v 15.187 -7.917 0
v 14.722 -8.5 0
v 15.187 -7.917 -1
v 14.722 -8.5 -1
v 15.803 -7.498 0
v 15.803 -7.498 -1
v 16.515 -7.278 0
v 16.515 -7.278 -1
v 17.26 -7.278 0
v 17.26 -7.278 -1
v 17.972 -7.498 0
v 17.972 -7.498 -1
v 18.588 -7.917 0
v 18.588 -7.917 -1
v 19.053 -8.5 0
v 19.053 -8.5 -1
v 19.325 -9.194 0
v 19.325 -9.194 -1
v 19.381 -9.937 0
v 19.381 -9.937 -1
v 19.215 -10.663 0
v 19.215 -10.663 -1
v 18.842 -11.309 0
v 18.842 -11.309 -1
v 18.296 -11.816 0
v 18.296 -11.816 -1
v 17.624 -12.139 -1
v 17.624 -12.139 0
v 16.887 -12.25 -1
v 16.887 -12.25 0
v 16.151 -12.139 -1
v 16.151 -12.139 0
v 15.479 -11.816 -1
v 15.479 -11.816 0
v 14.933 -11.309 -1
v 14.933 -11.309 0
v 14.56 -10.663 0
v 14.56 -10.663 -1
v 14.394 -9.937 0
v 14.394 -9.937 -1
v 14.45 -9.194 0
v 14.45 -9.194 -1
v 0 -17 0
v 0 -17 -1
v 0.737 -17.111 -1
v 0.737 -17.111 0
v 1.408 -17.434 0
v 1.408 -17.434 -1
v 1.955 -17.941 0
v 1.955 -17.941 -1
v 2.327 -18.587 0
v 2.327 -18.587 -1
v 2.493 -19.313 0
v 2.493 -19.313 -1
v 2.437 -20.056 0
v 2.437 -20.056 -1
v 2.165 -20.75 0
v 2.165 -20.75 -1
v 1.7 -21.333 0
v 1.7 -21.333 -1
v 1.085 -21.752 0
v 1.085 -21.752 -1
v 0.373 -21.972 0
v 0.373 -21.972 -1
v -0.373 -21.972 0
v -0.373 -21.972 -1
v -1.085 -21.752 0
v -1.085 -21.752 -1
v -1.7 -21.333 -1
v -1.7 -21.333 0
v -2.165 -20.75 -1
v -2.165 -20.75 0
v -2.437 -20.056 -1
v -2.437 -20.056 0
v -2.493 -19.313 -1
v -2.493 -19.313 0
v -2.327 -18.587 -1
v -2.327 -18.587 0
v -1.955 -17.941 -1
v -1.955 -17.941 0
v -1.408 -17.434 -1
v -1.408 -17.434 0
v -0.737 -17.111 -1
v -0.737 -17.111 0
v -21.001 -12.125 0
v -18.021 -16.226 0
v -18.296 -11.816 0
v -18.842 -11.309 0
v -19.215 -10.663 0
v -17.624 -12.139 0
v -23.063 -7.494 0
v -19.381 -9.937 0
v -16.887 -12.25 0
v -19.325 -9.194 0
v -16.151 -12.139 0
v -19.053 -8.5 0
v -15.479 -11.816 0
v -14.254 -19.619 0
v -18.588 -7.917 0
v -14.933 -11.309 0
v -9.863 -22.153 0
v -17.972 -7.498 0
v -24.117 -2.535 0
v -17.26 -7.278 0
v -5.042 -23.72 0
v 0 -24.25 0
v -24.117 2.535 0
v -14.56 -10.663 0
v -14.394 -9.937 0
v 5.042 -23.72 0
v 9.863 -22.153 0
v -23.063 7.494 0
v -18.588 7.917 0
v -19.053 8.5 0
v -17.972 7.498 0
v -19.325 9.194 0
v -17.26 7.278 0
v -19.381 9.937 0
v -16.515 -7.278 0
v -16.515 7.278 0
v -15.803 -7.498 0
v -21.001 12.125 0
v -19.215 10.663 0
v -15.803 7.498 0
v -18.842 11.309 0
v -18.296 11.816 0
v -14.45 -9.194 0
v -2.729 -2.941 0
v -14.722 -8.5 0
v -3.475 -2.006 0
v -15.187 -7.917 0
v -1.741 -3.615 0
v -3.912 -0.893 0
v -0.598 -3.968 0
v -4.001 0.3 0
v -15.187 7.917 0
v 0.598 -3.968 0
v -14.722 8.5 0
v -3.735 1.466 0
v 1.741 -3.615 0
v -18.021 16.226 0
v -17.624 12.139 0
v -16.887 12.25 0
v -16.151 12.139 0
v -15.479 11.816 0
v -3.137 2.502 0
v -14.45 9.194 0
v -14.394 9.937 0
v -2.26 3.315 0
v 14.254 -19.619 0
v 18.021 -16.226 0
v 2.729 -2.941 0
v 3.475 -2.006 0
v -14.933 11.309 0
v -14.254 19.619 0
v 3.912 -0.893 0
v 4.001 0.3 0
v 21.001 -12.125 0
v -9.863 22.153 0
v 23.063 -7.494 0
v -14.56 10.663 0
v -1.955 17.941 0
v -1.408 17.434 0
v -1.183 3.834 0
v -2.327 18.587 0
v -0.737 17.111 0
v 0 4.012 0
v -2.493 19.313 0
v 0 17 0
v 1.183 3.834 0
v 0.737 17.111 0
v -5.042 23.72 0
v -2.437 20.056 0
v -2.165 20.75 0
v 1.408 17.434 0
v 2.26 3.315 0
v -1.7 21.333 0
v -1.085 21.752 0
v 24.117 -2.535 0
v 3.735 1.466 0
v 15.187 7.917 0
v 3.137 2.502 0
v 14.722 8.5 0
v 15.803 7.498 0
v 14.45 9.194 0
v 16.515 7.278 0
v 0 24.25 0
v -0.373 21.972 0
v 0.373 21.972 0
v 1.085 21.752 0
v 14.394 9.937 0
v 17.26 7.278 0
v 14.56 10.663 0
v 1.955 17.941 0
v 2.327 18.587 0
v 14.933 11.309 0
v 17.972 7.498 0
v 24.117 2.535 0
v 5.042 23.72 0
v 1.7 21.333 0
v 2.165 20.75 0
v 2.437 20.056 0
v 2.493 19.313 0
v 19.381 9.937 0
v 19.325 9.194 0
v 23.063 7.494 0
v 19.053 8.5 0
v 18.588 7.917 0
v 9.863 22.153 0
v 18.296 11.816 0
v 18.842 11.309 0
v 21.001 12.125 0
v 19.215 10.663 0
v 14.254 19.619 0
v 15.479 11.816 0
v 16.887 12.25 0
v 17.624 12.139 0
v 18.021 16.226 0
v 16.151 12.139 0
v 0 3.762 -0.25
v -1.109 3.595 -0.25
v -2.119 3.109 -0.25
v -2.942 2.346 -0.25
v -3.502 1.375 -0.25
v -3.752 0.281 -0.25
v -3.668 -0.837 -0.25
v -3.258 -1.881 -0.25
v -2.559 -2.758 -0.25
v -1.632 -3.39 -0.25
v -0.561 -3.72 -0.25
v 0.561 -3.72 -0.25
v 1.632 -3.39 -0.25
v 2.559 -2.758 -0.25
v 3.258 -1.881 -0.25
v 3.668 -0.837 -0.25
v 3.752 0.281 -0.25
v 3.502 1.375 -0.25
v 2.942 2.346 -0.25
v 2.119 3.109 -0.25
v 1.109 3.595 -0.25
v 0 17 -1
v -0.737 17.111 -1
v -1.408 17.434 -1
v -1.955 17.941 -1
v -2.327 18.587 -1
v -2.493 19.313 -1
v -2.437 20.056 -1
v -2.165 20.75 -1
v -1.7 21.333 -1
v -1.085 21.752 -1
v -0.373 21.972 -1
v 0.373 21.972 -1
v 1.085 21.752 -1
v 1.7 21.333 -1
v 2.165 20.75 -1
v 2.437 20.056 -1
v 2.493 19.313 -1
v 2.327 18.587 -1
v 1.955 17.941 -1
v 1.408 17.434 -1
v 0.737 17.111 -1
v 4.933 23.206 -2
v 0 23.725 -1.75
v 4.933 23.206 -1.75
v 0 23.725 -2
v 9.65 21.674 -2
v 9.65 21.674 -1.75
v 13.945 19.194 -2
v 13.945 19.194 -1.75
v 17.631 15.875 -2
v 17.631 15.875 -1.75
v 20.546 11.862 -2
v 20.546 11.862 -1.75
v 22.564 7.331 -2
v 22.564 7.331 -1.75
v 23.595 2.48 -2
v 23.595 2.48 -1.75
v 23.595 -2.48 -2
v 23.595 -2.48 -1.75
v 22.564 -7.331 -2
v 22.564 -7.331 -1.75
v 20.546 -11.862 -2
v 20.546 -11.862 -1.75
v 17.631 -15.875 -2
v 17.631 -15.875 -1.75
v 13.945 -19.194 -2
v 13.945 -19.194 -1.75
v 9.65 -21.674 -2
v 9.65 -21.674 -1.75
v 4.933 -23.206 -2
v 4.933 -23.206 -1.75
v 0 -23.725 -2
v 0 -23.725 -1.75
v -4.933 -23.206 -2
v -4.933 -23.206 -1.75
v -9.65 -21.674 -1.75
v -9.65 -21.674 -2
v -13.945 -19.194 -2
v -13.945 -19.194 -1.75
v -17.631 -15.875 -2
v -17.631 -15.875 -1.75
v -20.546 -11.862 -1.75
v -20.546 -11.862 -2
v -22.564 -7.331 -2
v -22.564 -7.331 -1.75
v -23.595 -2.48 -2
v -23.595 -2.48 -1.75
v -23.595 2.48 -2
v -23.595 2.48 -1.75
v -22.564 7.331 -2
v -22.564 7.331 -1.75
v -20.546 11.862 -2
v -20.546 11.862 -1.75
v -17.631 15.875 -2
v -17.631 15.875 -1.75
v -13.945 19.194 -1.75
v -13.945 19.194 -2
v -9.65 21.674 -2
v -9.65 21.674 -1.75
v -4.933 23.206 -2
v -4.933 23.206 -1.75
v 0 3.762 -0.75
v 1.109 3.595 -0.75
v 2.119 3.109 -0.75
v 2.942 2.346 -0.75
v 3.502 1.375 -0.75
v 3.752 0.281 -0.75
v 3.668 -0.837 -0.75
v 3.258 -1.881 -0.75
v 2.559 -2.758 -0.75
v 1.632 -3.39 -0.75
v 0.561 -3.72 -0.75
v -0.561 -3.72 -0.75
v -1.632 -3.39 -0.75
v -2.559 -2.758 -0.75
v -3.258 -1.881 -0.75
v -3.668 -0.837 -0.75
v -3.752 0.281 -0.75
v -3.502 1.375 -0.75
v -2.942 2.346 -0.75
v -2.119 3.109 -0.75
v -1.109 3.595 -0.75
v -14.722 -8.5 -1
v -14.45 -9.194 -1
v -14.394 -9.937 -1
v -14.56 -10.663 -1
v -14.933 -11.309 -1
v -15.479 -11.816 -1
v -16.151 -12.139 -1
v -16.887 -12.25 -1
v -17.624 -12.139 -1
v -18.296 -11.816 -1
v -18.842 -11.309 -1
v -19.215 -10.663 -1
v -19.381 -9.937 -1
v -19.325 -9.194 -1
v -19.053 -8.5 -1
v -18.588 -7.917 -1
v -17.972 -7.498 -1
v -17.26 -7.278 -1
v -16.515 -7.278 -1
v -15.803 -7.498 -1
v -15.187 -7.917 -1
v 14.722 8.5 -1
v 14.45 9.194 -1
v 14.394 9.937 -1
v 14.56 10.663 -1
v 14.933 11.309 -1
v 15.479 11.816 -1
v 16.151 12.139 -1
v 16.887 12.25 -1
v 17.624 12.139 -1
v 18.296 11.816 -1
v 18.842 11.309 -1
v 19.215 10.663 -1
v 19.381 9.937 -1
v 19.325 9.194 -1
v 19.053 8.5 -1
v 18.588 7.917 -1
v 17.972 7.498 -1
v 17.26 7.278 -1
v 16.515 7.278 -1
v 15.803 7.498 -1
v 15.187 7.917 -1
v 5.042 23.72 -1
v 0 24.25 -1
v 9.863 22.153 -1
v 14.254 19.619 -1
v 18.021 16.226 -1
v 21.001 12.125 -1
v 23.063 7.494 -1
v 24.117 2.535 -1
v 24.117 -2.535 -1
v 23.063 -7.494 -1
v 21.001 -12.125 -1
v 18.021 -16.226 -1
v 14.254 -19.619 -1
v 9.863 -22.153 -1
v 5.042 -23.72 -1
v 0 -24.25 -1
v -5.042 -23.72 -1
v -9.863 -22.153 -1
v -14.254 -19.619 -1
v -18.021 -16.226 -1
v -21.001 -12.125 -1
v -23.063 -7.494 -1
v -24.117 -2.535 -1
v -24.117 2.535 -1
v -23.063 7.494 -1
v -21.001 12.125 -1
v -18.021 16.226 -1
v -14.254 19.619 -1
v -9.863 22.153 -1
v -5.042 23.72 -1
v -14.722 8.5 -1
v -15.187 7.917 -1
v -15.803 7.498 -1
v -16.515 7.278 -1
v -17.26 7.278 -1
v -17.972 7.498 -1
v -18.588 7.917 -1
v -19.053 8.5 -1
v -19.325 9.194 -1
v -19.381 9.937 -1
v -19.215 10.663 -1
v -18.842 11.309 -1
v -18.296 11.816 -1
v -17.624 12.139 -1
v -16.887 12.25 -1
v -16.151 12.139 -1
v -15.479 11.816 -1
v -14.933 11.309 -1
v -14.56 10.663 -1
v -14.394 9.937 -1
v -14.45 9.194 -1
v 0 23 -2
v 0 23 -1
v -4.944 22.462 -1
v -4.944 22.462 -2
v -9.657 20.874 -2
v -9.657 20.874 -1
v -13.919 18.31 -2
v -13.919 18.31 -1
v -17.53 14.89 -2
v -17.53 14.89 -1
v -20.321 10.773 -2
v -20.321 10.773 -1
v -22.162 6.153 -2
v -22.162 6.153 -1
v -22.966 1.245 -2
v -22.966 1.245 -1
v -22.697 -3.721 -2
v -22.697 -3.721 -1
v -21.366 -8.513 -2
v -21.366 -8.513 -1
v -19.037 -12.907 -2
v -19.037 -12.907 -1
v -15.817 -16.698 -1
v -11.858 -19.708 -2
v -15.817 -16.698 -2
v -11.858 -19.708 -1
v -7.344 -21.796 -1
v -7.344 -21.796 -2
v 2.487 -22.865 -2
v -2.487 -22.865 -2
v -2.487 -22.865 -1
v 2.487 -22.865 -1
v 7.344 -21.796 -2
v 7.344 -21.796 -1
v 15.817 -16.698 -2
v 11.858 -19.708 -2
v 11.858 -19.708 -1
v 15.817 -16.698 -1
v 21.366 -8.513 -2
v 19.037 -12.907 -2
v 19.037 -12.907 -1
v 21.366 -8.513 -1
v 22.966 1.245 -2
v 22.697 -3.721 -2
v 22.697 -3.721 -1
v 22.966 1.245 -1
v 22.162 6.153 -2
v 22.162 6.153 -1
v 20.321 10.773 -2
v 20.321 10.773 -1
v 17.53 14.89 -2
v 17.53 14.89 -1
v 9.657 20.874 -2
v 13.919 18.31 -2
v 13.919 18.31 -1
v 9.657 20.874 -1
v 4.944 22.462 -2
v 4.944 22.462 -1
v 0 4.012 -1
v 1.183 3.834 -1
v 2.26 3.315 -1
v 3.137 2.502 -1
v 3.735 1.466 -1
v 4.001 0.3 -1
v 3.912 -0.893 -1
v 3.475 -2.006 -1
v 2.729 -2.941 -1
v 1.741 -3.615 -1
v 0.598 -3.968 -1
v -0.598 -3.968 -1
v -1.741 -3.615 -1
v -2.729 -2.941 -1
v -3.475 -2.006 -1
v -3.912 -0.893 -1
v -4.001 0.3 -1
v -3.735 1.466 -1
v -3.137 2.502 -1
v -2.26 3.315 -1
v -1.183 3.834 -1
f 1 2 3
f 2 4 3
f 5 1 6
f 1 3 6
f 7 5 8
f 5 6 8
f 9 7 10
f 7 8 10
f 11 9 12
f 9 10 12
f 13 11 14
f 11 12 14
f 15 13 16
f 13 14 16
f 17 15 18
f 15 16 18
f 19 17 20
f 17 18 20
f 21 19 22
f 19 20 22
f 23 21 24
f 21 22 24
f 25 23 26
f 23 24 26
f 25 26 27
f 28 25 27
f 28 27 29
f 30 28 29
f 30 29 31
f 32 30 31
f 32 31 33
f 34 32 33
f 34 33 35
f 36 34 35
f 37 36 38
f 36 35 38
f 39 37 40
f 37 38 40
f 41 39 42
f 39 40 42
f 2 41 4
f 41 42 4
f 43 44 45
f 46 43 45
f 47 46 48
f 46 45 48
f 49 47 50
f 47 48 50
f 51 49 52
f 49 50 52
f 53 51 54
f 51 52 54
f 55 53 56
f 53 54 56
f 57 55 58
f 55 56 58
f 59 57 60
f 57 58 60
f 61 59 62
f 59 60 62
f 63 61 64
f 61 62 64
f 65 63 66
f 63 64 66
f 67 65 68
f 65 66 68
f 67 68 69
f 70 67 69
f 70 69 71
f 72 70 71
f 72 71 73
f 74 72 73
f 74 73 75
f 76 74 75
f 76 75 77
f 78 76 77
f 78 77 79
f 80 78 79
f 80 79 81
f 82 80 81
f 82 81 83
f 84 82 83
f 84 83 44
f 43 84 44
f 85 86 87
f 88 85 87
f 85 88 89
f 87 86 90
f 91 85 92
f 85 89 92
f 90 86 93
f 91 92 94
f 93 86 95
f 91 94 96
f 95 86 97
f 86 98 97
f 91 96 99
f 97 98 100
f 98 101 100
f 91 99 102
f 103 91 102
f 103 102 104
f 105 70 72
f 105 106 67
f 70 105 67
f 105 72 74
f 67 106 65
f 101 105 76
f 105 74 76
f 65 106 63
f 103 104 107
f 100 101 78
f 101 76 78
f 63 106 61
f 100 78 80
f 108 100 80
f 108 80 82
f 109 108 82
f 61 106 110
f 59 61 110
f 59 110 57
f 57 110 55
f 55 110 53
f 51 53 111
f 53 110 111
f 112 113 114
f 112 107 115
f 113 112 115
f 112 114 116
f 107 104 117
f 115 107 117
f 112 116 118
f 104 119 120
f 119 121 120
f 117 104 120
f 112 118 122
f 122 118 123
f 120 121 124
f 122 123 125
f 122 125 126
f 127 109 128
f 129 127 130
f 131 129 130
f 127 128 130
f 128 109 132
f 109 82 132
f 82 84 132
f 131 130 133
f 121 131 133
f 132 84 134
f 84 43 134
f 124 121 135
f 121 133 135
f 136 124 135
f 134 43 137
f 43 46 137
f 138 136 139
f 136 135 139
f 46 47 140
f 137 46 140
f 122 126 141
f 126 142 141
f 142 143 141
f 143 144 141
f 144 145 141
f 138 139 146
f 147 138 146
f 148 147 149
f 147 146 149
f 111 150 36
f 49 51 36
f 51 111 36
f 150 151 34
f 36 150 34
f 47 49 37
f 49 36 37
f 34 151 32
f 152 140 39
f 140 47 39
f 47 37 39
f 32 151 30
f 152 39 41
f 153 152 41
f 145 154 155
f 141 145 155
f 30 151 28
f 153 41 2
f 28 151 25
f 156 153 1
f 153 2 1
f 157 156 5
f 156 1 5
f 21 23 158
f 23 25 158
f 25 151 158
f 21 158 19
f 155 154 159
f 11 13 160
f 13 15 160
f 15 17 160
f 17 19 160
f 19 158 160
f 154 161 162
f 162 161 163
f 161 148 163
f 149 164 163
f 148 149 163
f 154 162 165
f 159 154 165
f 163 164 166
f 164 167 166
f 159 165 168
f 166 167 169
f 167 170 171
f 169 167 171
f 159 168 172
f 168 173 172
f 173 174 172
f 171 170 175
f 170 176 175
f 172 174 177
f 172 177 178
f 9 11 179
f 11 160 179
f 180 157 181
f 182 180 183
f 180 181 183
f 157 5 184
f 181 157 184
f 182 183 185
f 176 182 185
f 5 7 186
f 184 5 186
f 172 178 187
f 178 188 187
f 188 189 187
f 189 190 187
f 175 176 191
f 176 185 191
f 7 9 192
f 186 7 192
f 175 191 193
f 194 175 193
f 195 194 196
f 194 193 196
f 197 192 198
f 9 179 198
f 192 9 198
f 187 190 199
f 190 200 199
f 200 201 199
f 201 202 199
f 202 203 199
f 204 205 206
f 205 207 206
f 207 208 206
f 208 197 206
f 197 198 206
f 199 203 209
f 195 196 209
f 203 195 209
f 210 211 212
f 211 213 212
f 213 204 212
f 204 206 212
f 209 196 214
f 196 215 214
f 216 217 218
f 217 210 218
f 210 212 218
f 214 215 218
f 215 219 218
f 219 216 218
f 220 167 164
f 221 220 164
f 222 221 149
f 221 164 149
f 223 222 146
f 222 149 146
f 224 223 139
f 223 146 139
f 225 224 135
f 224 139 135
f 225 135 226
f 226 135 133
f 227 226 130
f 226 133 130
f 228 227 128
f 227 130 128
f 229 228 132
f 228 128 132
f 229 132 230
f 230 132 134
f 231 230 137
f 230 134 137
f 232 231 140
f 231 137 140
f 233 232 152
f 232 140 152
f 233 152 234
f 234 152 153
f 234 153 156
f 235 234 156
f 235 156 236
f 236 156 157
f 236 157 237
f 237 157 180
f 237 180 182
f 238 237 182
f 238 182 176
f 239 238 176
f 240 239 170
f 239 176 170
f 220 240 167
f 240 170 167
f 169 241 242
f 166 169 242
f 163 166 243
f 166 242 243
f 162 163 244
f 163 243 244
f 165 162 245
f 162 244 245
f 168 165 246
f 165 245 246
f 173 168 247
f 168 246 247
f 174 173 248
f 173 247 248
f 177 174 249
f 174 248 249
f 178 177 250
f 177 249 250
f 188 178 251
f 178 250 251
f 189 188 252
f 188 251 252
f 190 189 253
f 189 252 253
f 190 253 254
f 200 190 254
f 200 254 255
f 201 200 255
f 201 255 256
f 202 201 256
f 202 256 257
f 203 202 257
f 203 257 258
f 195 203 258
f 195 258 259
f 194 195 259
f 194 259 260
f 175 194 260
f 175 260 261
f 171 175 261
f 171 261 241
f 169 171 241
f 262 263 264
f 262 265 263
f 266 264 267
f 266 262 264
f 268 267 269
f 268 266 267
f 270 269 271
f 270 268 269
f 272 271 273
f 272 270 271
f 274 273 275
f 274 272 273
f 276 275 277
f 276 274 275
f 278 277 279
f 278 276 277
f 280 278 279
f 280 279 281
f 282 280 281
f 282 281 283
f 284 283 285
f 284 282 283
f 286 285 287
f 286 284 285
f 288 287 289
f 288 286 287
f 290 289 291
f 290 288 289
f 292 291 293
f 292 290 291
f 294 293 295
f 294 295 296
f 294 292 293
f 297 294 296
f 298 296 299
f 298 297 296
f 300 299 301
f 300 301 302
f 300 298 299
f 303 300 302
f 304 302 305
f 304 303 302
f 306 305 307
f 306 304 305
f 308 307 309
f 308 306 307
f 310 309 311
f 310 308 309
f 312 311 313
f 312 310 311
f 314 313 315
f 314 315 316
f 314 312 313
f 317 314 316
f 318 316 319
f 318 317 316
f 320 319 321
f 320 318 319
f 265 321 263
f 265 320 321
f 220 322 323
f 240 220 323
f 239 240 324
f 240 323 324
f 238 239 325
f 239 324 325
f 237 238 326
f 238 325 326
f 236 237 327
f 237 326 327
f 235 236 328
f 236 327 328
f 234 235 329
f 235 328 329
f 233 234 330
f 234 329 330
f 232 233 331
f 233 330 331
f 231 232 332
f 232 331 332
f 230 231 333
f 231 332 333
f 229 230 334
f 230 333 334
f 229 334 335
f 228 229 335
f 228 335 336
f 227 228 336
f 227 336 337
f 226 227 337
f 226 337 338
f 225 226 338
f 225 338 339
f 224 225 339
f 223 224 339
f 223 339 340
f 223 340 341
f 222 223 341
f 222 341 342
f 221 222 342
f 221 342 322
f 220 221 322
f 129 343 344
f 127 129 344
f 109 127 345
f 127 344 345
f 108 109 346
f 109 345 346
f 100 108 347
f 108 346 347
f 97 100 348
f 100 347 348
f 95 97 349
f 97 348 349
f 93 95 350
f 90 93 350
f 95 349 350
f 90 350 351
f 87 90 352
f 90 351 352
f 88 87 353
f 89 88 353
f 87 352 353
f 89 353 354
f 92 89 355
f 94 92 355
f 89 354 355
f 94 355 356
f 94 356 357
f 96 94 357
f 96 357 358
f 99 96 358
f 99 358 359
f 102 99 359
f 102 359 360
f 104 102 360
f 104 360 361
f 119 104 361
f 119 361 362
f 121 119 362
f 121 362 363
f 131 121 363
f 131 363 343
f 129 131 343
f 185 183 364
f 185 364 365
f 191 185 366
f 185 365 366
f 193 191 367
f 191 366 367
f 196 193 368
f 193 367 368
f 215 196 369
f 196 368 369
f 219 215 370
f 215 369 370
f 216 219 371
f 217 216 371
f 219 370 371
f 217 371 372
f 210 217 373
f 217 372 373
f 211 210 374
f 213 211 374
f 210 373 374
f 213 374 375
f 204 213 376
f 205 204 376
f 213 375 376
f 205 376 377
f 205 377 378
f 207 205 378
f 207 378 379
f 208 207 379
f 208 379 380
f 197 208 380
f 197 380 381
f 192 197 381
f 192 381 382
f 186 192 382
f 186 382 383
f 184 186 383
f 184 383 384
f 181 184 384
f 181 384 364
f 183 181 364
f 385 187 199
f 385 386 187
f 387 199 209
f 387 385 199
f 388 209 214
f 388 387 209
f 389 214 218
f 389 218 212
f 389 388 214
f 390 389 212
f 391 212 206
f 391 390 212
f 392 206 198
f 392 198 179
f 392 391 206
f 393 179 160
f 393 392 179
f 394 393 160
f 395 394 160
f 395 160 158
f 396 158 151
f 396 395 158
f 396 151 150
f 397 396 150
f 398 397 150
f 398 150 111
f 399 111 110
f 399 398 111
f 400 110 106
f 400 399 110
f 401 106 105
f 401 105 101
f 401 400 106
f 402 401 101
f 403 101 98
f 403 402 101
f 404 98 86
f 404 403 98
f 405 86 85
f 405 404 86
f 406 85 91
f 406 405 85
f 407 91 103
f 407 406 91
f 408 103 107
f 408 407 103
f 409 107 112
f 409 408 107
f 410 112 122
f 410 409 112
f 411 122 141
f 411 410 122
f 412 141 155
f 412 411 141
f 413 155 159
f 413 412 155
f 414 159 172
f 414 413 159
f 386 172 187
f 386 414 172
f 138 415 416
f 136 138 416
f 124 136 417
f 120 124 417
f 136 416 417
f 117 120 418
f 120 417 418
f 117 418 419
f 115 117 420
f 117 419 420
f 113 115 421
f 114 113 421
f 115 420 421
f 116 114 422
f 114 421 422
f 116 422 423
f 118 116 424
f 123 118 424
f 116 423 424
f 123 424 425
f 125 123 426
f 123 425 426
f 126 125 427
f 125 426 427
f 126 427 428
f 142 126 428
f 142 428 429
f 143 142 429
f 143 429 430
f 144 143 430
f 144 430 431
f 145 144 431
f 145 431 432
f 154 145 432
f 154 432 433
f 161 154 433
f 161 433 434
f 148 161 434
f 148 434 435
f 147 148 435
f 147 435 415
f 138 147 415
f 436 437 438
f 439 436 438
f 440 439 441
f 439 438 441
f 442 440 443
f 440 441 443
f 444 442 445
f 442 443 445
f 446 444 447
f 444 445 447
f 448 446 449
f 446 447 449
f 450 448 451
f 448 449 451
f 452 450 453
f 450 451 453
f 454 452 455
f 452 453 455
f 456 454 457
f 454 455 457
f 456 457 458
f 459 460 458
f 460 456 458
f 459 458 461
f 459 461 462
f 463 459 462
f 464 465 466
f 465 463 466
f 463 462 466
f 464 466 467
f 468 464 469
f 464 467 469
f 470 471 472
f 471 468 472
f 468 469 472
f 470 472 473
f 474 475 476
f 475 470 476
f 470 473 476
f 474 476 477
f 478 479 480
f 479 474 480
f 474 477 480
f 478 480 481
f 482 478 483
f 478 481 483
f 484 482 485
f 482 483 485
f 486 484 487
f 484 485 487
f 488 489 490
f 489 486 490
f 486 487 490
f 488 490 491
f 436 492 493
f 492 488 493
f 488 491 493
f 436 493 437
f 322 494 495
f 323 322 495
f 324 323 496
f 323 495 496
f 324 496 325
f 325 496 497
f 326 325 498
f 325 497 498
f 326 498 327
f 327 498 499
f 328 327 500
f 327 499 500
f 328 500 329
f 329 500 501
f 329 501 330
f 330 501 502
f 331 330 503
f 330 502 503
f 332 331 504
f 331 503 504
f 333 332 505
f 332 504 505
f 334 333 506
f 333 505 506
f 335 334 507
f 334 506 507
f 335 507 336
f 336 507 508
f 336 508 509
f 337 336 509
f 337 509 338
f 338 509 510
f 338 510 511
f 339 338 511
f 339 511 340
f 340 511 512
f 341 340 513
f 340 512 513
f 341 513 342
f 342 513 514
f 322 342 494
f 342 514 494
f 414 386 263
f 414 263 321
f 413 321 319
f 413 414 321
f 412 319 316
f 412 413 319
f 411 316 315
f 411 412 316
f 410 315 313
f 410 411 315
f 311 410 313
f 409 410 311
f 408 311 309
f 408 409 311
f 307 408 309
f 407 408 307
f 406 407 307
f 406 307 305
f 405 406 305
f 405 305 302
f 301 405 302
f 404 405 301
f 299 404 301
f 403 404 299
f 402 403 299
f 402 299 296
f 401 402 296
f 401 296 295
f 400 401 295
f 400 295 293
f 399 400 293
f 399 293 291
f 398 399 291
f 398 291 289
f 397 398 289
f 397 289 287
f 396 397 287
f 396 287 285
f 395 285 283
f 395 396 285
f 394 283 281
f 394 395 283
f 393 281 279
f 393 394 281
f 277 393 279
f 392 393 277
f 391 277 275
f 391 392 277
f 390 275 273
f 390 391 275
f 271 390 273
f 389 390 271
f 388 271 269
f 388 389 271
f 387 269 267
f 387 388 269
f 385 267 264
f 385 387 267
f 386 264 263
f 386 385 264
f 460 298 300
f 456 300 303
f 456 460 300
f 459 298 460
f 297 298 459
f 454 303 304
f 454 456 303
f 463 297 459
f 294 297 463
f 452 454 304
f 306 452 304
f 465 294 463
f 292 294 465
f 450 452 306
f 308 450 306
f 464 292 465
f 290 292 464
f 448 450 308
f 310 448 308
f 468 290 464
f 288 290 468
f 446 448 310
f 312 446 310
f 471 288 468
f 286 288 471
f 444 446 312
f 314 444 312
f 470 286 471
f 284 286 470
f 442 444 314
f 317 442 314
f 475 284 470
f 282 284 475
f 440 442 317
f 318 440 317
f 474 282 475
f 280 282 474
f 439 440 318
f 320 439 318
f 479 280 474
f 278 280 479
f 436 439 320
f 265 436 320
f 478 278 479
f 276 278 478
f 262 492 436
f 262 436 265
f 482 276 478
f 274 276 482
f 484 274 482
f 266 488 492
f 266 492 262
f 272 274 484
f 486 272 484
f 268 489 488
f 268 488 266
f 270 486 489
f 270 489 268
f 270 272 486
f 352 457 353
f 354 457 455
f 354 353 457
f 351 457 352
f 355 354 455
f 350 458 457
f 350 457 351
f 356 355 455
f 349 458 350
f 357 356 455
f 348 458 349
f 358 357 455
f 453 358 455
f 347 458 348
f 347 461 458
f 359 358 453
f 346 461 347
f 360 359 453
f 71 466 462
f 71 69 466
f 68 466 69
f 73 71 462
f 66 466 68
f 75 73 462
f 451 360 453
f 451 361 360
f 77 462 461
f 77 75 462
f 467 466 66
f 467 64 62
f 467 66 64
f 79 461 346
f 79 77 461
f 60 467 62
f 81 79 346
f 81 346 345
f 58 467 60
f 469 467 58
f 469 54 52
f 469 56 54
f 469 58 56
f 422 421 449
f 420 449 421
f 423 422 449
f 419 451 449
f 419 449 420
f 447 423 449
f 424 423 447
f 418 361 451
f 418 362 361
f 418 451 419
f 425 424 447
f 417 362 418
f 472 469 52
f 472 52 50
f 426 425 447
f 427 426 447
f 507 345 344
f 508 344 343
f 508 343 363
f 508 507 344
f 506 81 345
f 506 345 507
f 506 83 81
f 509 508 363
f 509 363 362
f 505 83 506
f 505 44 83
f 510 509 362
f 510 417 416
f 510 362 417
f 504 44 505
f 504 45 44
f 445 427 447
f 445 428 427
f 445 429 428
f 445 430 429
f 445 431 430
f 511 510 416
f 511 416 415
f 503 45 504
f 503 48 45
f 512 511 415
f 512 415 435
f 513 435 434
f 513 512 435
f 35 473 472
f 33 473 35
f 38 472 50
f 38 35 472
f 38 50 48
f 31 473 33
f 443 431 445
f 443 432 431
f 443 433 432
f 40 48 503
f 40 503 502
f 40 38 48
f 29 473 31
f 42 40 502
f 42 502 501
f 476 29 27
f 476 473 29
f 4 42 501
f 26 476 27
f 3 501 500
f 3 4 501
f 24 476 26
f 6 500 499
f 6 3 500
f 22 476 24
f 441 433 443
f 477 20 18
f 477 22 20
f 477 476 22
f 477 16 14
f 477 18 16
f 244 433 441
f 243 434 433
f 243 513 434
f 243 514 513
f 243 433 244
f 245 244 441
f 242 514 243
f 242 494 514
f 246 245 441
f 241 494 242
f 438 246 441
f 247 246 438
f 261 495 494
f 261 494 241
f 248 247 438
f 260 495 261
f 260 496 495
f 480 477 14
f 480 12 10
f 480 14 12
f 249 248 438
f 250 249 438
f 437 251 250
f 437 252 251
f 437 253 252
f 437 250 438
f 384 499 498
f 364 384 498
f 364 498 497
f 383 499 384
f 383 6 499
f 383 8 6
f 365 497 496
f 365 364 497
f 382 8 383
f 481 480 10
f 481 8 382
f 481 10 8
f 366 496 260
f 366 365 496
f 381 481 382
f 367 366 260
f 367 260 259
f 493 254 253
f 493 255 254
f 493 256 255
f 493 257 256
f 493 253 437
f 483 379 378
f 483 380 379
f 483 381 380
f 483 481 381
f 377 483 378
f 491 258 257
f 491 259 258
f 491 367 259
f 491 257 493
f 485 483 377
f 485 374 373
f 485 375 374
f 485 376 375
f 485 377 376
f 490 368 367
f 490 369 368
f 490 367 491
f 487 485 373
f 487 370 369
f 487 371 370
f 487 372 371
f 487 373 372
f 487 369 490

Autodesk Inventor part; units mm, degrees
ref_plane "YZ Plane" through (0, 0, 0) normal (1, 0, 0) x (0, 1, 0)
ref_plane "XZ Plane" through (0, 0, 0) normal (0, 1, 0) x (-1, 0, 0)
ref_plane "XY Plane" through (0, 0, 0) normal (0, 0, 1) x (1, 0, 0)
sketch "Sketch2" plane through (0, 0, 0) normal (1, 0, 0) x (0, 1, 0)
  line L0 (13.4931, 0) -> (24.25, 0)
  line L1 (24.25, 0) -> (24.25, -1)
  line L2 (24.25, -1) -> (23.7248, -1.75)
  line L3 (23.7248, -1.75) -> (23.7248, -2)
  line L4 (23.7248, -2) -> (23, -2)
  line L5 (0, 0) -> (0, -8.2884)
  line L6 (23, -2) -> (23, -1)
  line L7 (23, -1) -> (3.7625, -1)
  line L8 (13.4931, 0) -> (3.7625, 0)
  line L9 (3.7625, 0) -> (3.7625, -1)
  dimension "d3" = 1
  dimension "d4" = 145
  dimension "d5" = 0.75
  dimension "d7" = 0.25
  dimension "d8" = 2
  dimension "d10" = 48.5
  dimension "d11" = 47.4497
  dimension "d12" = 1.25
  dimension "d13" = 7.525
revolve "Revolution1" add sketch "Sketch2" angle 360 about axis through (0, 0, 0) along (0, 0, -1)
sketch "Sketch3" plane through (0, 0, 0) normal (0, 0, 1) x (1, 0, 0)
  circle A0 centre (0, 0) radius 3.7625 projected
  circle A1 centre (0, 0) radius 3.7625 projected
  circle A2 centre (0, 0) radius 24.25 projected
  point P0 (0, 0)
  point P1 (0, 0)
  point P2 (0, 19.5)
  dimension "d15" = 19.5
  dimension "d16" = 48.5
hole "Hole1" at (0, 0, 0) at (0, 19.5, 0) direction (0, 0, -1) diameter 5 end through all
pattern_circular "Circular Pattern1" count 6 over 360 about axis through (0, 0, -10) along (0, 0, 1) of "Hole1"
chamfer "Chamfer1" distance 0.25 angle 45 2 edges at (0, -3.7625, 0) (0, -3.7625, -1)
properties part number "Front cover of servo motor" material "Aluminum 6061-AHC"
